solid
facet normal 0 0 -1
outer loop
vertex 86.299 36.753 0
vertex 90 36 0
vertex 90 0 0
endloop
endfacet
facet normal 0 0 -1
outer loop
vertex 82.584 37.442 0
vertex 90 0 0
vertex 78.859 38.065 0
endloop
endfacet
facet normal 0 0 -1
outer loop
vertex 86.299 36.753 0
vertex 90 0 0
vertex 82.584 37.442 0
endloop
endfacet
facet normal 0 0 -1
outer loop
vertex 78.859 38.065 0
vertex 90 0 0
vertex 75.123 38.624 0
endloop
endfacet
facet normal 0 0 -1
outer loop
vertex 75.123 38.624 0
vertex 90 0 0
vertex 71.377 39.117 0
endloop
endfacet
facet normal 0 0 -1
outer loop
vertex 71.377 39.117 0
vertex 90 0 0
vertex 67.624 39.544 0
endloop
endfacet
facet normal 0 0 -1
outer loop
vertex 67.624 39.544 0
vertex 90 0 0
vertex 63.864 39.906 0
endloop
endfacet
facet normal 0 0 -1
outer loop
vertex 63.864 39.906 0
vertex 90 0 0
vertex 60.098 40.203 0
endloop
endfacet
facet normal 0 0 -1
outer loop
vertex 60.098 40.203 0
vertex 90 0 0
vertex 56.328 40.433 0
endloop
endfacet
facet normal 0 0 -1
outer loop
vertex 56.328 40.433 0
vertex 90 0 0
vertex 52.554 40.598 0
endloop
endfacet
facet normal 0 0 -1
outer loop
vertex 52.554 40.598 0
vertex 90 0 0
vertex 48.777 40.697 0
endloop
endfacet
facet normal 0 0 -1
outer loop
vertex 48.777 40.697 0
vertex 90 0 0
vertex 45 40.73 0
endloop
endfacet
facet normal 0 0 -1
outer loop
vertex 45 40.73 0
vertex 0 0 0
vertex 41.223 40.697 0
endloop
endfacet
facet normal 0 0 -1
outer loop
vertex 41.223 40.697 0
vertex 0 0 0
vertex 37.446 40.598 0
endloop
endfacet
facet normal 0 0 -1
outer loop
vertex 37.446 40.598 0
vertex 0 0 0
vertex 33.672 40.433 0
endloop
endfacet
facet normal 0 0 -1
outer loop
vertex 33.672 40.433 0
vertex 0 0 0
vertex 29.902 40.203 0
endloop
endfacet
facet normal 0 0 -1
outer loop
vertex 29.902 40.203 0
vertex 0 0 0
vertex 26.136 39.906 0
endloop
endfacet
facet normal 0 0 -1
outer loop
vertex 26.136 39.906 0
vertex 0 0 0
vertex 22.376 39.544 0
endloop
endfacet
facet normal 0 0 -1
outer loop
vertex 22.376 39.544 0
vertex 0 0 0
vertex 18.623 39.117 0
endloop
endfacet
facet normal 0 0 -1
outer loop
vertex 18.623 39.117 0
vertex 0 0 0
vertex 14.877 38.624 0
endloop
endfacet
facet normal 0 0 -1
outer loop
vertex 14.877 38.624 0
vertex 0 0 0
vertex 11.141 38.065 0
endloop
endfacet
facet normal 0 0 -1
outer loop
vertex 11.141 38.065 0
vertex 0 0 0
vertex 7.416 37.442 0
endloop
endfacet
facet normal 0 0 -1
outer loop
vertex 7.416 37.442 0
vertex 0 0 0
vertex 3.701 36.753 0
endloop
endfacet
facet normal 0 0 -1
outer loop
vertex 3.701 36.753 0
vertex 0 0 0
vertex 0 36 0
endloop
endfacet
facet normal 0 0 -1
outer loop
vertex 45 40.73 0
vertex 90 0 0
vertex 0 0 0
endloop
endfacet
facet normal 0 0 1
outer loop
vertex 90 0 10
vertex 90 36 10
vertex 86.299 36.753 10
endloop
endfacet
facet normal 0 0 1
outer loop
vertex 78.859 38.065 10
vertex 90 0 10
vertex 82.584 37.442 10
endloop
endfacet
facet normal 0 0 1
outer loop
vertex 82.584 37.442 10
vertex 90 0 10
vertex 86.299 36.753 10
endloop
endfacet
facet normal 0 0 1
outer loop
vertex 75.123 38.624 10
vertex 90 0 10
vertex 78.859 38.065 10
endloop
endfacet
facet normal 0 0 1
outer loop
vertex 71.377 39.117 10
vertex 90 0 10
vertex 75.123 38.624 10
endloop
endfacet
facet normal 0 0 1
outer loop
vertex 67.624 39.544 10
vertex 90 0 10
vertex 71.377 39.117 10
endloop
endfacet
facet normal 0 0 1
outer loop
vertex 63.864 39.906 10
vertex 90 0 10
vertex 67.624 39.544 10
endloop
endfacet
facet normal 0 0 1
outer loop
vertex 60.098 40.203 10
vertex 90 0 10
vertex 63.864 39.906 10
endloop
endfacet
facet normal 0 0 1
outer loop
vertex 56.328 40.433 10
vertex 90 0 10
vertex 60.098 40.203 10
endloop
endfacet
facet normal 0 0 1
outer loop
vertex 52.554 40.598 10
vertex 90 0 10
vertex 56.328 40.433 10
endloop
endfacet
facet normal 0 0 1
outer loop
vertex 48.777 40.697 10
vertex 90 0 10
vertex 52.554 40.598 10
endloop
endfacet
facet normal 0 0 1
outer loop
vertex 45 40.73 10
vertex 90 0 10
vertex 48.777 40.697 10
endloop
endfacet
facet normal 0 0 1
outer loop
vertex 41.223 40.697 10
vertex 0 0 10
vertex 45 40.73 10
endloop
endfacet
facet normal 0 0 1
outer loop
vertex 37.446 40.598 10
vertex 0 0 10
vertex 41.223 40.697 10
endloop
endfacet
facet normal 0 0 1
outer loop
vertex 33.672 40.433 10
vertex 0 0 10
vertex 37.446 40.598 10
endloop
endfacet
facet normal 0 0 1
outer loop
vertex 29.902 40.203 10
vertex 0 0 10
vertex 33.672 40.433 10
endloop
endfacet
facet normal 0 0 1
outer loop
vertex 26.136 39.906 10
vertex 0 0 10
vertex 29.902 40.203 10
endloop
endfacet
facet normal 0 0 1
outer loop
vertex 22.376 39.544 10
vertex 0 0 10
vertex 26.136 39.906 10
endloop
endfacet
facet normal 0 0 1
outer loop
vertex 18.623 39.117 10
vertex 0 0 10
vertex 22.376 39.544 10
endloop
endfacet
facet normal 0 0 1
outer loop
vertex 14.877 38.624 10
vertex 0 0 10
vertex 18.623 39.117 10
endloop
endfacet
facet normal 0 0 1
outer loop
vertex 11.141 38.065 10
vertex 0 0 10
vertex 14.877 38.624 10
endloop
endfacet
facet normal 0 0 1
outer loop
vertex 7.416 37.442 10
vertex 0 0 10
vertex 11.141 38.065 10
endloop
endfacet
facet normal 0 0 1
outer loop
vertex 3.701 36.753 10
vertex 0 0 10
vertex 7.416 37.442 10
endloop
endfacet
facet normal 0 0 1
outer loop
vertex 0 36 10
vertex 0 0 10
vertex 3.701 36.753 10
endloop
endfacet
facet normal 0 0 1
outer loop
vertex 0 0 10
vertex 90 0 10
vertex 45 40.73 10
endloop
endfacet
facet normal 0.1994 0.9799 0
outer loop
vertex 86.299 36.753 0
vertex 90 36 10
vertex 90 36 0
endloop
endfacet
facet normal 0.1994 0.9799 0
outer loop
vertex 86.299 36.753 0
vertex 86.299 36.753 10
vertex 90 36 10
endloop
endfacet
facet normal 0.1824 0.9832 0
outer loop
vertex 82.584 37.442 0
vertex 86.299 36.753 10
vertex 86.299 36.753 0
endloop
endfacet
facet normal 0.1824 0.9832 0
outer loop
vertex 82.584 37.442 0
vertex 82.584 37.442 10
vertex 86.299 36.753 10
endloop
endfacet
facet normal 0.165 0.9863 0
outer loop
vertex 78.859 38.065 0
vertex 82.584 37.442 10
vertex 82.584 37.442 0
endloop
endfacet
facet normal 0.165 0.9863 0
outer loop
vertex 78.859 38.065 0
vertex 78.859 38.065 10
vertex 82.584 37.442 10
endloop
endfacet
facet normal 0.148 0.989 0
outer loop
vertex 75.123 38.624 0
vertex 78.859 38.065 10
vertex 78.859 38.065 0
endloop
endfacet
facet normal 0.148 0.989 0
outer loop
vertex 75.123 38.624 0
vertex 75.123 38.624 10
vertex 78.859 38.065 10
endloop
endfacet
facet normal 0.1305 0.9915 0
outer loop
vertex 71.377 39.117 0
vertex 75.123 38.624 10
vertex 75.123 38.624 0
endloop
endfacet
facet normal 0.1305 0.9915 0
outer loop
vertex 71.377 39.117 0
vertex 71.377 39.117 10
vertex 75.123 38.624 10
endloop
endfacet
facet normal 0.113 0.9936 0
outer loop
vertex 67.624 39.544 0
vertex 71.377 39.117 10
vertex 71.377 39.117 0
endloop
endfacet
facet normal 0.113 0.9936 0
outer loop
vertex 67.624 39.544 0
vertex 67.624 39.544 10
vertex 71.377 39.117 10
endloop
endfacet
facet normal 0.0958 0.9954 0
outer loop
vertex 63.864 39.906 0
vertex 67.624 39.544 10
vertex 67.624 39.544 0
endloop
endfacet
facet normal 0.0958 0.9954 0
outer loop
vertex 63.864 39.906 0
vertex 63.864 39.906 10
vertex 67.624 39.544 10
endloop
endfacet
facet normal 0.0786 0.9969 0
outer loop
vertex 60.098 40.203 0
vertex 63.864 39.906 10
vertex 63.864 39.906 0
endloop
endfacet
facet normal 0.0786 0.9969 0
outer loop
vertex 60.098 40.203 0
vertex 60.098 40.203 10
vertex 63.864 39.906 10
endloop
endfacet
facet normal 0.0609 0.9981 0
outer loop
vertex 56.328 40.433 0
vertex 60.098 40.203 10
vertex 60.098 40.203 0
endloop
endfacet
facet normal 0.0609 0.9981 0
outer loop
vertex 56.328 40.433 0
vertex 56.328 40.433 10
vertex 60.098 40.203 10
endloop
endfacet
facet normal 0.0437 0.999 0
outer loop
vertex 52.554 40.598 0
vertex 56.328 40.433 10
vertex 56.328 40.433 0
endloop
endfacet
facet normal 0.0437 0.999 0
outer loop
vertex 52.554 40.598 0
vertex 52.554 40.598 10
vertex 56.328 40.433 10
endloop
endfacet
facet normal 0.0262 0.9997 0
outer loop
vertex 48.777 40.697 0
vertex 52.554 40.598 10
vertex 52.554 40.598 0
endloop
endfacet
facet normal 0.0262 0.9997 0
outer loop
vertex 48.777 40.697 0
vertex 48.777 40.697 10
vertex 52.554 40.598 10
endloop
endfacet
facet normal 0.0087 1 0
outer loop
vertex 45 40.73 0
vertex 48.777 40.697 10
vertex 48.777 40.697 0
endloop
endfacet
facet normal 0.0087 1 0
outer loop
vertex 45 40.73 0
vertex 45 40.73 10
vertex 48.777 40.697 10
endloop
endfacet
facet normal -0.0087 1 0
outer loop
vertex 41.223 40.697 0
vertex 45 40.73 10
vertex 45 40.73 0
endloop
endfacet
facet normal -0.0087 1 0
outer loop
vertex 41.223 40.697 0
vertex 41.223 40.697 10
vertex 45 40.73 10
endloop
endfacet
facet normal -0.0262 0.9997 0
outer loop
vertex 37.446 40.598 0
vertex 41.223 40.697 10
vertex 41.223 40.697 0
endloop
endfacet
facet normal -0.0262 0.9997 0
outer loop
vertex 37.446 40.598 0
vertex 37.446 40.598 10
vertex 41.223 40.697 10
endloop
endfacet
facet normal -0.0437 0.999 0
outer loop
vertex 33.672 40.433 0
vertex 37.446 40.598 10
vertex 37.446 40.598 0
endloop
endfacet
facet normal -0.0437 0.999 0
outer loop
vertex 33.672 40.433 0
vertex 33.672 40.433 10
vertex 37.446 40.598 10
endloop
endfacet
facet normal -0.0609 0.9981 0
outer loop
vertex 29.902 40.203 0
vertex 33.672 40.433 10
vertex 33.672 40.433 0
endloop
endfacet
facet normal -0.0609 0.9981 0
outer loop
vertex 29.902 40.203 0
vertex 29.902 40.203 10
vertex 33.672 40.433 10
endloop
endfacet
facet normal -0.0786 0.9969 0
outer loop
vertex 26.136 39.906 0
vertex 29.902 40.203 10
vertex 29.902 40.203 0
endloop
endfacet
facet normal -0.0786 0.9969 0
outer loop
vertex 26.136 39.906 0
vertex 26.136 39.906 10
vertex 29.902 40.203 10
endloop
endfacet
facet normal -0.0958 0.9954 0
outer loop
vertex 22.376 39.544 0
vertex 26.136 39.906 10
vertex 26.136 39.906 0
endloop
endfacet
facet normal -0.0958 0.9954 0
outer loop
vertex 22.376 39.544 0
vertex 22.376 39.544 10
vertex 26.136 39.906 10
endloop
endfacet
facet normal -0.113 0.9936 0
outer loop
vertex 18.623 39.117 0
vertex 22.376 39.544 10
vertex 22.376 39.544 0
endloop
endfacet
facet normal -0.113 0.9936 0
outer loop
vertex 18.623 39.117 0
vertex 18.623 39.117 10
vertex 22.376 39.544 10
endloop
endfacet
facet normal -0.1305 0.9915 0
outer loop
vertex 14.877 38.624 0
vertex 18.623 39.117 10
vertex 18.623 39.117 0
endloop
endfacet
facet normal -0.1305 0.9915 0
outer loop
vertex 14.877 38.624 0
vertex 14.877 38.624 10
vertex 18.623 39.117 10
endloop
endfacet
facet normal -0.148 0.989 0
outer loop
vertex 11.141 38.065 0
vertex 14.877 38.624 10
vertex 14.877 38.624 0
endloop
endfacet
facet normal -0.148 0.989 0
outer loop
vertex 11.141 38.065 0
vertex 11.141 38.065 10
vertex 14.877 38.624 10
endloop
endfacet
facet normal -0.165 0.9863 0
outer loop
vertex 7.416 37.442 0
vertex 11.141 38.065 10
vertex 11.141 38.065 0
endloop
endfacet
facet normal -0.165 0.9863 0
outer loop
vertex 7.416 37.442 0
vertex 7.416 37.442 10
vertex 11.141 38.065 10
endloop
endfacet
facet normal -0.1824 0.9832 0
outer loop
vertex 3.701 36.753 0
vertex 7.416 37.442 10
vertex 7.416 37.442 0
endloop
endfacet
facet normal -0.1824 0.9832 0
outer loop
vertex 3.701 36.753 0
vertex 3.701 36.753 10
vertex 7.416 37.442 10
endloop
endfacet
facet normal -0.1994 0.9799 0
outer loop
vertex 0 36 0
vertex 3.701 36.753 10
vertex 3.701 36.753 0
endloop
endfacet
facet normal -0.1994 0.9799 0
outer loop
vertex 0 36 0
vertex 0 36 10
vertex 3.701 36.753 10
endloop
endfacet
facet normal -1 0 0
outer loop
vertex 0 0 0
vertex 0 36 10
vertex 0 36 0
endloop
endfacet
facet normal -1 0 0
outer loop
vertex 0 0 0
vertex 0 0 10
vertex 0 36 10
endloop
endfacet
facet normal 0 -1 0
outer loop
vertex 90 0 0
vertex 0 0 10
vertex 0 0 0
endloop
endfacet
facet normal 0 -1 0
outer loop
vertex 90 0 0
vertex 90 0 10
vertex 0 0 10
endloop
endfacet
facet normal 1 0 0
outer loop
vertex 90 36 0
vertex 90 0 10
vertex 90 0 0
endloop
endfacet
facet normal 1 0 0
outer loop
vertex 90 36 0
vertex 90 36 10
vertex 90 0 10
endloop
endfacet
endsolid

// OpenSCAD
$fn = 32;

// ----------------------------------------------------------------------
// Arc profile plate: crown, 27 points
// ----------------------------------------------------------------------

// --- parameters (mm) ---
bar_l = 90;               // bar length, X
bar_w = 36;               // bar height at the ends, Y
arc_r = 216.44;           // radius of the crown arc
arc_angle = 24;           // crown arc angle, degrees
crown_rise = 4.73;        // rise of the crown over the ends
arc_step = 1;             // sampling step of the crown arc, degrees
plate_t = 10;             // plate thickness, Z

bbox_y = bar_w + crown_rise;  // full height with the crown

profile = [[90, 36], [86.299, 36.753], [82.584, 37.442], [78.859, 38.065], [75.123, 38.624], [71.377, 39.117], [67.624, 39.544], [63.864, 39.906], [60.098, 40.203], [56.328, 40.433], [52.554, 40.598], [48.777, 40.697], [45, 40.73], [41.223, 40.697], [37.446, 40.598], [33.672, 40.433], [29.902, 40.203], [26.136, 39.906], [22.376, 39.544], [18.623, 39.117], [14.877, 38.624], [11.141, 38.065], [7.416, 37.442], [3.701, 36.753], [0, 36], [0, 0], [90, 0]];  // primary outline, 27 points, counter clockwise

// --- the one profile operation ---
linear_extrude(height = plate_t) polygon(points = profile);
